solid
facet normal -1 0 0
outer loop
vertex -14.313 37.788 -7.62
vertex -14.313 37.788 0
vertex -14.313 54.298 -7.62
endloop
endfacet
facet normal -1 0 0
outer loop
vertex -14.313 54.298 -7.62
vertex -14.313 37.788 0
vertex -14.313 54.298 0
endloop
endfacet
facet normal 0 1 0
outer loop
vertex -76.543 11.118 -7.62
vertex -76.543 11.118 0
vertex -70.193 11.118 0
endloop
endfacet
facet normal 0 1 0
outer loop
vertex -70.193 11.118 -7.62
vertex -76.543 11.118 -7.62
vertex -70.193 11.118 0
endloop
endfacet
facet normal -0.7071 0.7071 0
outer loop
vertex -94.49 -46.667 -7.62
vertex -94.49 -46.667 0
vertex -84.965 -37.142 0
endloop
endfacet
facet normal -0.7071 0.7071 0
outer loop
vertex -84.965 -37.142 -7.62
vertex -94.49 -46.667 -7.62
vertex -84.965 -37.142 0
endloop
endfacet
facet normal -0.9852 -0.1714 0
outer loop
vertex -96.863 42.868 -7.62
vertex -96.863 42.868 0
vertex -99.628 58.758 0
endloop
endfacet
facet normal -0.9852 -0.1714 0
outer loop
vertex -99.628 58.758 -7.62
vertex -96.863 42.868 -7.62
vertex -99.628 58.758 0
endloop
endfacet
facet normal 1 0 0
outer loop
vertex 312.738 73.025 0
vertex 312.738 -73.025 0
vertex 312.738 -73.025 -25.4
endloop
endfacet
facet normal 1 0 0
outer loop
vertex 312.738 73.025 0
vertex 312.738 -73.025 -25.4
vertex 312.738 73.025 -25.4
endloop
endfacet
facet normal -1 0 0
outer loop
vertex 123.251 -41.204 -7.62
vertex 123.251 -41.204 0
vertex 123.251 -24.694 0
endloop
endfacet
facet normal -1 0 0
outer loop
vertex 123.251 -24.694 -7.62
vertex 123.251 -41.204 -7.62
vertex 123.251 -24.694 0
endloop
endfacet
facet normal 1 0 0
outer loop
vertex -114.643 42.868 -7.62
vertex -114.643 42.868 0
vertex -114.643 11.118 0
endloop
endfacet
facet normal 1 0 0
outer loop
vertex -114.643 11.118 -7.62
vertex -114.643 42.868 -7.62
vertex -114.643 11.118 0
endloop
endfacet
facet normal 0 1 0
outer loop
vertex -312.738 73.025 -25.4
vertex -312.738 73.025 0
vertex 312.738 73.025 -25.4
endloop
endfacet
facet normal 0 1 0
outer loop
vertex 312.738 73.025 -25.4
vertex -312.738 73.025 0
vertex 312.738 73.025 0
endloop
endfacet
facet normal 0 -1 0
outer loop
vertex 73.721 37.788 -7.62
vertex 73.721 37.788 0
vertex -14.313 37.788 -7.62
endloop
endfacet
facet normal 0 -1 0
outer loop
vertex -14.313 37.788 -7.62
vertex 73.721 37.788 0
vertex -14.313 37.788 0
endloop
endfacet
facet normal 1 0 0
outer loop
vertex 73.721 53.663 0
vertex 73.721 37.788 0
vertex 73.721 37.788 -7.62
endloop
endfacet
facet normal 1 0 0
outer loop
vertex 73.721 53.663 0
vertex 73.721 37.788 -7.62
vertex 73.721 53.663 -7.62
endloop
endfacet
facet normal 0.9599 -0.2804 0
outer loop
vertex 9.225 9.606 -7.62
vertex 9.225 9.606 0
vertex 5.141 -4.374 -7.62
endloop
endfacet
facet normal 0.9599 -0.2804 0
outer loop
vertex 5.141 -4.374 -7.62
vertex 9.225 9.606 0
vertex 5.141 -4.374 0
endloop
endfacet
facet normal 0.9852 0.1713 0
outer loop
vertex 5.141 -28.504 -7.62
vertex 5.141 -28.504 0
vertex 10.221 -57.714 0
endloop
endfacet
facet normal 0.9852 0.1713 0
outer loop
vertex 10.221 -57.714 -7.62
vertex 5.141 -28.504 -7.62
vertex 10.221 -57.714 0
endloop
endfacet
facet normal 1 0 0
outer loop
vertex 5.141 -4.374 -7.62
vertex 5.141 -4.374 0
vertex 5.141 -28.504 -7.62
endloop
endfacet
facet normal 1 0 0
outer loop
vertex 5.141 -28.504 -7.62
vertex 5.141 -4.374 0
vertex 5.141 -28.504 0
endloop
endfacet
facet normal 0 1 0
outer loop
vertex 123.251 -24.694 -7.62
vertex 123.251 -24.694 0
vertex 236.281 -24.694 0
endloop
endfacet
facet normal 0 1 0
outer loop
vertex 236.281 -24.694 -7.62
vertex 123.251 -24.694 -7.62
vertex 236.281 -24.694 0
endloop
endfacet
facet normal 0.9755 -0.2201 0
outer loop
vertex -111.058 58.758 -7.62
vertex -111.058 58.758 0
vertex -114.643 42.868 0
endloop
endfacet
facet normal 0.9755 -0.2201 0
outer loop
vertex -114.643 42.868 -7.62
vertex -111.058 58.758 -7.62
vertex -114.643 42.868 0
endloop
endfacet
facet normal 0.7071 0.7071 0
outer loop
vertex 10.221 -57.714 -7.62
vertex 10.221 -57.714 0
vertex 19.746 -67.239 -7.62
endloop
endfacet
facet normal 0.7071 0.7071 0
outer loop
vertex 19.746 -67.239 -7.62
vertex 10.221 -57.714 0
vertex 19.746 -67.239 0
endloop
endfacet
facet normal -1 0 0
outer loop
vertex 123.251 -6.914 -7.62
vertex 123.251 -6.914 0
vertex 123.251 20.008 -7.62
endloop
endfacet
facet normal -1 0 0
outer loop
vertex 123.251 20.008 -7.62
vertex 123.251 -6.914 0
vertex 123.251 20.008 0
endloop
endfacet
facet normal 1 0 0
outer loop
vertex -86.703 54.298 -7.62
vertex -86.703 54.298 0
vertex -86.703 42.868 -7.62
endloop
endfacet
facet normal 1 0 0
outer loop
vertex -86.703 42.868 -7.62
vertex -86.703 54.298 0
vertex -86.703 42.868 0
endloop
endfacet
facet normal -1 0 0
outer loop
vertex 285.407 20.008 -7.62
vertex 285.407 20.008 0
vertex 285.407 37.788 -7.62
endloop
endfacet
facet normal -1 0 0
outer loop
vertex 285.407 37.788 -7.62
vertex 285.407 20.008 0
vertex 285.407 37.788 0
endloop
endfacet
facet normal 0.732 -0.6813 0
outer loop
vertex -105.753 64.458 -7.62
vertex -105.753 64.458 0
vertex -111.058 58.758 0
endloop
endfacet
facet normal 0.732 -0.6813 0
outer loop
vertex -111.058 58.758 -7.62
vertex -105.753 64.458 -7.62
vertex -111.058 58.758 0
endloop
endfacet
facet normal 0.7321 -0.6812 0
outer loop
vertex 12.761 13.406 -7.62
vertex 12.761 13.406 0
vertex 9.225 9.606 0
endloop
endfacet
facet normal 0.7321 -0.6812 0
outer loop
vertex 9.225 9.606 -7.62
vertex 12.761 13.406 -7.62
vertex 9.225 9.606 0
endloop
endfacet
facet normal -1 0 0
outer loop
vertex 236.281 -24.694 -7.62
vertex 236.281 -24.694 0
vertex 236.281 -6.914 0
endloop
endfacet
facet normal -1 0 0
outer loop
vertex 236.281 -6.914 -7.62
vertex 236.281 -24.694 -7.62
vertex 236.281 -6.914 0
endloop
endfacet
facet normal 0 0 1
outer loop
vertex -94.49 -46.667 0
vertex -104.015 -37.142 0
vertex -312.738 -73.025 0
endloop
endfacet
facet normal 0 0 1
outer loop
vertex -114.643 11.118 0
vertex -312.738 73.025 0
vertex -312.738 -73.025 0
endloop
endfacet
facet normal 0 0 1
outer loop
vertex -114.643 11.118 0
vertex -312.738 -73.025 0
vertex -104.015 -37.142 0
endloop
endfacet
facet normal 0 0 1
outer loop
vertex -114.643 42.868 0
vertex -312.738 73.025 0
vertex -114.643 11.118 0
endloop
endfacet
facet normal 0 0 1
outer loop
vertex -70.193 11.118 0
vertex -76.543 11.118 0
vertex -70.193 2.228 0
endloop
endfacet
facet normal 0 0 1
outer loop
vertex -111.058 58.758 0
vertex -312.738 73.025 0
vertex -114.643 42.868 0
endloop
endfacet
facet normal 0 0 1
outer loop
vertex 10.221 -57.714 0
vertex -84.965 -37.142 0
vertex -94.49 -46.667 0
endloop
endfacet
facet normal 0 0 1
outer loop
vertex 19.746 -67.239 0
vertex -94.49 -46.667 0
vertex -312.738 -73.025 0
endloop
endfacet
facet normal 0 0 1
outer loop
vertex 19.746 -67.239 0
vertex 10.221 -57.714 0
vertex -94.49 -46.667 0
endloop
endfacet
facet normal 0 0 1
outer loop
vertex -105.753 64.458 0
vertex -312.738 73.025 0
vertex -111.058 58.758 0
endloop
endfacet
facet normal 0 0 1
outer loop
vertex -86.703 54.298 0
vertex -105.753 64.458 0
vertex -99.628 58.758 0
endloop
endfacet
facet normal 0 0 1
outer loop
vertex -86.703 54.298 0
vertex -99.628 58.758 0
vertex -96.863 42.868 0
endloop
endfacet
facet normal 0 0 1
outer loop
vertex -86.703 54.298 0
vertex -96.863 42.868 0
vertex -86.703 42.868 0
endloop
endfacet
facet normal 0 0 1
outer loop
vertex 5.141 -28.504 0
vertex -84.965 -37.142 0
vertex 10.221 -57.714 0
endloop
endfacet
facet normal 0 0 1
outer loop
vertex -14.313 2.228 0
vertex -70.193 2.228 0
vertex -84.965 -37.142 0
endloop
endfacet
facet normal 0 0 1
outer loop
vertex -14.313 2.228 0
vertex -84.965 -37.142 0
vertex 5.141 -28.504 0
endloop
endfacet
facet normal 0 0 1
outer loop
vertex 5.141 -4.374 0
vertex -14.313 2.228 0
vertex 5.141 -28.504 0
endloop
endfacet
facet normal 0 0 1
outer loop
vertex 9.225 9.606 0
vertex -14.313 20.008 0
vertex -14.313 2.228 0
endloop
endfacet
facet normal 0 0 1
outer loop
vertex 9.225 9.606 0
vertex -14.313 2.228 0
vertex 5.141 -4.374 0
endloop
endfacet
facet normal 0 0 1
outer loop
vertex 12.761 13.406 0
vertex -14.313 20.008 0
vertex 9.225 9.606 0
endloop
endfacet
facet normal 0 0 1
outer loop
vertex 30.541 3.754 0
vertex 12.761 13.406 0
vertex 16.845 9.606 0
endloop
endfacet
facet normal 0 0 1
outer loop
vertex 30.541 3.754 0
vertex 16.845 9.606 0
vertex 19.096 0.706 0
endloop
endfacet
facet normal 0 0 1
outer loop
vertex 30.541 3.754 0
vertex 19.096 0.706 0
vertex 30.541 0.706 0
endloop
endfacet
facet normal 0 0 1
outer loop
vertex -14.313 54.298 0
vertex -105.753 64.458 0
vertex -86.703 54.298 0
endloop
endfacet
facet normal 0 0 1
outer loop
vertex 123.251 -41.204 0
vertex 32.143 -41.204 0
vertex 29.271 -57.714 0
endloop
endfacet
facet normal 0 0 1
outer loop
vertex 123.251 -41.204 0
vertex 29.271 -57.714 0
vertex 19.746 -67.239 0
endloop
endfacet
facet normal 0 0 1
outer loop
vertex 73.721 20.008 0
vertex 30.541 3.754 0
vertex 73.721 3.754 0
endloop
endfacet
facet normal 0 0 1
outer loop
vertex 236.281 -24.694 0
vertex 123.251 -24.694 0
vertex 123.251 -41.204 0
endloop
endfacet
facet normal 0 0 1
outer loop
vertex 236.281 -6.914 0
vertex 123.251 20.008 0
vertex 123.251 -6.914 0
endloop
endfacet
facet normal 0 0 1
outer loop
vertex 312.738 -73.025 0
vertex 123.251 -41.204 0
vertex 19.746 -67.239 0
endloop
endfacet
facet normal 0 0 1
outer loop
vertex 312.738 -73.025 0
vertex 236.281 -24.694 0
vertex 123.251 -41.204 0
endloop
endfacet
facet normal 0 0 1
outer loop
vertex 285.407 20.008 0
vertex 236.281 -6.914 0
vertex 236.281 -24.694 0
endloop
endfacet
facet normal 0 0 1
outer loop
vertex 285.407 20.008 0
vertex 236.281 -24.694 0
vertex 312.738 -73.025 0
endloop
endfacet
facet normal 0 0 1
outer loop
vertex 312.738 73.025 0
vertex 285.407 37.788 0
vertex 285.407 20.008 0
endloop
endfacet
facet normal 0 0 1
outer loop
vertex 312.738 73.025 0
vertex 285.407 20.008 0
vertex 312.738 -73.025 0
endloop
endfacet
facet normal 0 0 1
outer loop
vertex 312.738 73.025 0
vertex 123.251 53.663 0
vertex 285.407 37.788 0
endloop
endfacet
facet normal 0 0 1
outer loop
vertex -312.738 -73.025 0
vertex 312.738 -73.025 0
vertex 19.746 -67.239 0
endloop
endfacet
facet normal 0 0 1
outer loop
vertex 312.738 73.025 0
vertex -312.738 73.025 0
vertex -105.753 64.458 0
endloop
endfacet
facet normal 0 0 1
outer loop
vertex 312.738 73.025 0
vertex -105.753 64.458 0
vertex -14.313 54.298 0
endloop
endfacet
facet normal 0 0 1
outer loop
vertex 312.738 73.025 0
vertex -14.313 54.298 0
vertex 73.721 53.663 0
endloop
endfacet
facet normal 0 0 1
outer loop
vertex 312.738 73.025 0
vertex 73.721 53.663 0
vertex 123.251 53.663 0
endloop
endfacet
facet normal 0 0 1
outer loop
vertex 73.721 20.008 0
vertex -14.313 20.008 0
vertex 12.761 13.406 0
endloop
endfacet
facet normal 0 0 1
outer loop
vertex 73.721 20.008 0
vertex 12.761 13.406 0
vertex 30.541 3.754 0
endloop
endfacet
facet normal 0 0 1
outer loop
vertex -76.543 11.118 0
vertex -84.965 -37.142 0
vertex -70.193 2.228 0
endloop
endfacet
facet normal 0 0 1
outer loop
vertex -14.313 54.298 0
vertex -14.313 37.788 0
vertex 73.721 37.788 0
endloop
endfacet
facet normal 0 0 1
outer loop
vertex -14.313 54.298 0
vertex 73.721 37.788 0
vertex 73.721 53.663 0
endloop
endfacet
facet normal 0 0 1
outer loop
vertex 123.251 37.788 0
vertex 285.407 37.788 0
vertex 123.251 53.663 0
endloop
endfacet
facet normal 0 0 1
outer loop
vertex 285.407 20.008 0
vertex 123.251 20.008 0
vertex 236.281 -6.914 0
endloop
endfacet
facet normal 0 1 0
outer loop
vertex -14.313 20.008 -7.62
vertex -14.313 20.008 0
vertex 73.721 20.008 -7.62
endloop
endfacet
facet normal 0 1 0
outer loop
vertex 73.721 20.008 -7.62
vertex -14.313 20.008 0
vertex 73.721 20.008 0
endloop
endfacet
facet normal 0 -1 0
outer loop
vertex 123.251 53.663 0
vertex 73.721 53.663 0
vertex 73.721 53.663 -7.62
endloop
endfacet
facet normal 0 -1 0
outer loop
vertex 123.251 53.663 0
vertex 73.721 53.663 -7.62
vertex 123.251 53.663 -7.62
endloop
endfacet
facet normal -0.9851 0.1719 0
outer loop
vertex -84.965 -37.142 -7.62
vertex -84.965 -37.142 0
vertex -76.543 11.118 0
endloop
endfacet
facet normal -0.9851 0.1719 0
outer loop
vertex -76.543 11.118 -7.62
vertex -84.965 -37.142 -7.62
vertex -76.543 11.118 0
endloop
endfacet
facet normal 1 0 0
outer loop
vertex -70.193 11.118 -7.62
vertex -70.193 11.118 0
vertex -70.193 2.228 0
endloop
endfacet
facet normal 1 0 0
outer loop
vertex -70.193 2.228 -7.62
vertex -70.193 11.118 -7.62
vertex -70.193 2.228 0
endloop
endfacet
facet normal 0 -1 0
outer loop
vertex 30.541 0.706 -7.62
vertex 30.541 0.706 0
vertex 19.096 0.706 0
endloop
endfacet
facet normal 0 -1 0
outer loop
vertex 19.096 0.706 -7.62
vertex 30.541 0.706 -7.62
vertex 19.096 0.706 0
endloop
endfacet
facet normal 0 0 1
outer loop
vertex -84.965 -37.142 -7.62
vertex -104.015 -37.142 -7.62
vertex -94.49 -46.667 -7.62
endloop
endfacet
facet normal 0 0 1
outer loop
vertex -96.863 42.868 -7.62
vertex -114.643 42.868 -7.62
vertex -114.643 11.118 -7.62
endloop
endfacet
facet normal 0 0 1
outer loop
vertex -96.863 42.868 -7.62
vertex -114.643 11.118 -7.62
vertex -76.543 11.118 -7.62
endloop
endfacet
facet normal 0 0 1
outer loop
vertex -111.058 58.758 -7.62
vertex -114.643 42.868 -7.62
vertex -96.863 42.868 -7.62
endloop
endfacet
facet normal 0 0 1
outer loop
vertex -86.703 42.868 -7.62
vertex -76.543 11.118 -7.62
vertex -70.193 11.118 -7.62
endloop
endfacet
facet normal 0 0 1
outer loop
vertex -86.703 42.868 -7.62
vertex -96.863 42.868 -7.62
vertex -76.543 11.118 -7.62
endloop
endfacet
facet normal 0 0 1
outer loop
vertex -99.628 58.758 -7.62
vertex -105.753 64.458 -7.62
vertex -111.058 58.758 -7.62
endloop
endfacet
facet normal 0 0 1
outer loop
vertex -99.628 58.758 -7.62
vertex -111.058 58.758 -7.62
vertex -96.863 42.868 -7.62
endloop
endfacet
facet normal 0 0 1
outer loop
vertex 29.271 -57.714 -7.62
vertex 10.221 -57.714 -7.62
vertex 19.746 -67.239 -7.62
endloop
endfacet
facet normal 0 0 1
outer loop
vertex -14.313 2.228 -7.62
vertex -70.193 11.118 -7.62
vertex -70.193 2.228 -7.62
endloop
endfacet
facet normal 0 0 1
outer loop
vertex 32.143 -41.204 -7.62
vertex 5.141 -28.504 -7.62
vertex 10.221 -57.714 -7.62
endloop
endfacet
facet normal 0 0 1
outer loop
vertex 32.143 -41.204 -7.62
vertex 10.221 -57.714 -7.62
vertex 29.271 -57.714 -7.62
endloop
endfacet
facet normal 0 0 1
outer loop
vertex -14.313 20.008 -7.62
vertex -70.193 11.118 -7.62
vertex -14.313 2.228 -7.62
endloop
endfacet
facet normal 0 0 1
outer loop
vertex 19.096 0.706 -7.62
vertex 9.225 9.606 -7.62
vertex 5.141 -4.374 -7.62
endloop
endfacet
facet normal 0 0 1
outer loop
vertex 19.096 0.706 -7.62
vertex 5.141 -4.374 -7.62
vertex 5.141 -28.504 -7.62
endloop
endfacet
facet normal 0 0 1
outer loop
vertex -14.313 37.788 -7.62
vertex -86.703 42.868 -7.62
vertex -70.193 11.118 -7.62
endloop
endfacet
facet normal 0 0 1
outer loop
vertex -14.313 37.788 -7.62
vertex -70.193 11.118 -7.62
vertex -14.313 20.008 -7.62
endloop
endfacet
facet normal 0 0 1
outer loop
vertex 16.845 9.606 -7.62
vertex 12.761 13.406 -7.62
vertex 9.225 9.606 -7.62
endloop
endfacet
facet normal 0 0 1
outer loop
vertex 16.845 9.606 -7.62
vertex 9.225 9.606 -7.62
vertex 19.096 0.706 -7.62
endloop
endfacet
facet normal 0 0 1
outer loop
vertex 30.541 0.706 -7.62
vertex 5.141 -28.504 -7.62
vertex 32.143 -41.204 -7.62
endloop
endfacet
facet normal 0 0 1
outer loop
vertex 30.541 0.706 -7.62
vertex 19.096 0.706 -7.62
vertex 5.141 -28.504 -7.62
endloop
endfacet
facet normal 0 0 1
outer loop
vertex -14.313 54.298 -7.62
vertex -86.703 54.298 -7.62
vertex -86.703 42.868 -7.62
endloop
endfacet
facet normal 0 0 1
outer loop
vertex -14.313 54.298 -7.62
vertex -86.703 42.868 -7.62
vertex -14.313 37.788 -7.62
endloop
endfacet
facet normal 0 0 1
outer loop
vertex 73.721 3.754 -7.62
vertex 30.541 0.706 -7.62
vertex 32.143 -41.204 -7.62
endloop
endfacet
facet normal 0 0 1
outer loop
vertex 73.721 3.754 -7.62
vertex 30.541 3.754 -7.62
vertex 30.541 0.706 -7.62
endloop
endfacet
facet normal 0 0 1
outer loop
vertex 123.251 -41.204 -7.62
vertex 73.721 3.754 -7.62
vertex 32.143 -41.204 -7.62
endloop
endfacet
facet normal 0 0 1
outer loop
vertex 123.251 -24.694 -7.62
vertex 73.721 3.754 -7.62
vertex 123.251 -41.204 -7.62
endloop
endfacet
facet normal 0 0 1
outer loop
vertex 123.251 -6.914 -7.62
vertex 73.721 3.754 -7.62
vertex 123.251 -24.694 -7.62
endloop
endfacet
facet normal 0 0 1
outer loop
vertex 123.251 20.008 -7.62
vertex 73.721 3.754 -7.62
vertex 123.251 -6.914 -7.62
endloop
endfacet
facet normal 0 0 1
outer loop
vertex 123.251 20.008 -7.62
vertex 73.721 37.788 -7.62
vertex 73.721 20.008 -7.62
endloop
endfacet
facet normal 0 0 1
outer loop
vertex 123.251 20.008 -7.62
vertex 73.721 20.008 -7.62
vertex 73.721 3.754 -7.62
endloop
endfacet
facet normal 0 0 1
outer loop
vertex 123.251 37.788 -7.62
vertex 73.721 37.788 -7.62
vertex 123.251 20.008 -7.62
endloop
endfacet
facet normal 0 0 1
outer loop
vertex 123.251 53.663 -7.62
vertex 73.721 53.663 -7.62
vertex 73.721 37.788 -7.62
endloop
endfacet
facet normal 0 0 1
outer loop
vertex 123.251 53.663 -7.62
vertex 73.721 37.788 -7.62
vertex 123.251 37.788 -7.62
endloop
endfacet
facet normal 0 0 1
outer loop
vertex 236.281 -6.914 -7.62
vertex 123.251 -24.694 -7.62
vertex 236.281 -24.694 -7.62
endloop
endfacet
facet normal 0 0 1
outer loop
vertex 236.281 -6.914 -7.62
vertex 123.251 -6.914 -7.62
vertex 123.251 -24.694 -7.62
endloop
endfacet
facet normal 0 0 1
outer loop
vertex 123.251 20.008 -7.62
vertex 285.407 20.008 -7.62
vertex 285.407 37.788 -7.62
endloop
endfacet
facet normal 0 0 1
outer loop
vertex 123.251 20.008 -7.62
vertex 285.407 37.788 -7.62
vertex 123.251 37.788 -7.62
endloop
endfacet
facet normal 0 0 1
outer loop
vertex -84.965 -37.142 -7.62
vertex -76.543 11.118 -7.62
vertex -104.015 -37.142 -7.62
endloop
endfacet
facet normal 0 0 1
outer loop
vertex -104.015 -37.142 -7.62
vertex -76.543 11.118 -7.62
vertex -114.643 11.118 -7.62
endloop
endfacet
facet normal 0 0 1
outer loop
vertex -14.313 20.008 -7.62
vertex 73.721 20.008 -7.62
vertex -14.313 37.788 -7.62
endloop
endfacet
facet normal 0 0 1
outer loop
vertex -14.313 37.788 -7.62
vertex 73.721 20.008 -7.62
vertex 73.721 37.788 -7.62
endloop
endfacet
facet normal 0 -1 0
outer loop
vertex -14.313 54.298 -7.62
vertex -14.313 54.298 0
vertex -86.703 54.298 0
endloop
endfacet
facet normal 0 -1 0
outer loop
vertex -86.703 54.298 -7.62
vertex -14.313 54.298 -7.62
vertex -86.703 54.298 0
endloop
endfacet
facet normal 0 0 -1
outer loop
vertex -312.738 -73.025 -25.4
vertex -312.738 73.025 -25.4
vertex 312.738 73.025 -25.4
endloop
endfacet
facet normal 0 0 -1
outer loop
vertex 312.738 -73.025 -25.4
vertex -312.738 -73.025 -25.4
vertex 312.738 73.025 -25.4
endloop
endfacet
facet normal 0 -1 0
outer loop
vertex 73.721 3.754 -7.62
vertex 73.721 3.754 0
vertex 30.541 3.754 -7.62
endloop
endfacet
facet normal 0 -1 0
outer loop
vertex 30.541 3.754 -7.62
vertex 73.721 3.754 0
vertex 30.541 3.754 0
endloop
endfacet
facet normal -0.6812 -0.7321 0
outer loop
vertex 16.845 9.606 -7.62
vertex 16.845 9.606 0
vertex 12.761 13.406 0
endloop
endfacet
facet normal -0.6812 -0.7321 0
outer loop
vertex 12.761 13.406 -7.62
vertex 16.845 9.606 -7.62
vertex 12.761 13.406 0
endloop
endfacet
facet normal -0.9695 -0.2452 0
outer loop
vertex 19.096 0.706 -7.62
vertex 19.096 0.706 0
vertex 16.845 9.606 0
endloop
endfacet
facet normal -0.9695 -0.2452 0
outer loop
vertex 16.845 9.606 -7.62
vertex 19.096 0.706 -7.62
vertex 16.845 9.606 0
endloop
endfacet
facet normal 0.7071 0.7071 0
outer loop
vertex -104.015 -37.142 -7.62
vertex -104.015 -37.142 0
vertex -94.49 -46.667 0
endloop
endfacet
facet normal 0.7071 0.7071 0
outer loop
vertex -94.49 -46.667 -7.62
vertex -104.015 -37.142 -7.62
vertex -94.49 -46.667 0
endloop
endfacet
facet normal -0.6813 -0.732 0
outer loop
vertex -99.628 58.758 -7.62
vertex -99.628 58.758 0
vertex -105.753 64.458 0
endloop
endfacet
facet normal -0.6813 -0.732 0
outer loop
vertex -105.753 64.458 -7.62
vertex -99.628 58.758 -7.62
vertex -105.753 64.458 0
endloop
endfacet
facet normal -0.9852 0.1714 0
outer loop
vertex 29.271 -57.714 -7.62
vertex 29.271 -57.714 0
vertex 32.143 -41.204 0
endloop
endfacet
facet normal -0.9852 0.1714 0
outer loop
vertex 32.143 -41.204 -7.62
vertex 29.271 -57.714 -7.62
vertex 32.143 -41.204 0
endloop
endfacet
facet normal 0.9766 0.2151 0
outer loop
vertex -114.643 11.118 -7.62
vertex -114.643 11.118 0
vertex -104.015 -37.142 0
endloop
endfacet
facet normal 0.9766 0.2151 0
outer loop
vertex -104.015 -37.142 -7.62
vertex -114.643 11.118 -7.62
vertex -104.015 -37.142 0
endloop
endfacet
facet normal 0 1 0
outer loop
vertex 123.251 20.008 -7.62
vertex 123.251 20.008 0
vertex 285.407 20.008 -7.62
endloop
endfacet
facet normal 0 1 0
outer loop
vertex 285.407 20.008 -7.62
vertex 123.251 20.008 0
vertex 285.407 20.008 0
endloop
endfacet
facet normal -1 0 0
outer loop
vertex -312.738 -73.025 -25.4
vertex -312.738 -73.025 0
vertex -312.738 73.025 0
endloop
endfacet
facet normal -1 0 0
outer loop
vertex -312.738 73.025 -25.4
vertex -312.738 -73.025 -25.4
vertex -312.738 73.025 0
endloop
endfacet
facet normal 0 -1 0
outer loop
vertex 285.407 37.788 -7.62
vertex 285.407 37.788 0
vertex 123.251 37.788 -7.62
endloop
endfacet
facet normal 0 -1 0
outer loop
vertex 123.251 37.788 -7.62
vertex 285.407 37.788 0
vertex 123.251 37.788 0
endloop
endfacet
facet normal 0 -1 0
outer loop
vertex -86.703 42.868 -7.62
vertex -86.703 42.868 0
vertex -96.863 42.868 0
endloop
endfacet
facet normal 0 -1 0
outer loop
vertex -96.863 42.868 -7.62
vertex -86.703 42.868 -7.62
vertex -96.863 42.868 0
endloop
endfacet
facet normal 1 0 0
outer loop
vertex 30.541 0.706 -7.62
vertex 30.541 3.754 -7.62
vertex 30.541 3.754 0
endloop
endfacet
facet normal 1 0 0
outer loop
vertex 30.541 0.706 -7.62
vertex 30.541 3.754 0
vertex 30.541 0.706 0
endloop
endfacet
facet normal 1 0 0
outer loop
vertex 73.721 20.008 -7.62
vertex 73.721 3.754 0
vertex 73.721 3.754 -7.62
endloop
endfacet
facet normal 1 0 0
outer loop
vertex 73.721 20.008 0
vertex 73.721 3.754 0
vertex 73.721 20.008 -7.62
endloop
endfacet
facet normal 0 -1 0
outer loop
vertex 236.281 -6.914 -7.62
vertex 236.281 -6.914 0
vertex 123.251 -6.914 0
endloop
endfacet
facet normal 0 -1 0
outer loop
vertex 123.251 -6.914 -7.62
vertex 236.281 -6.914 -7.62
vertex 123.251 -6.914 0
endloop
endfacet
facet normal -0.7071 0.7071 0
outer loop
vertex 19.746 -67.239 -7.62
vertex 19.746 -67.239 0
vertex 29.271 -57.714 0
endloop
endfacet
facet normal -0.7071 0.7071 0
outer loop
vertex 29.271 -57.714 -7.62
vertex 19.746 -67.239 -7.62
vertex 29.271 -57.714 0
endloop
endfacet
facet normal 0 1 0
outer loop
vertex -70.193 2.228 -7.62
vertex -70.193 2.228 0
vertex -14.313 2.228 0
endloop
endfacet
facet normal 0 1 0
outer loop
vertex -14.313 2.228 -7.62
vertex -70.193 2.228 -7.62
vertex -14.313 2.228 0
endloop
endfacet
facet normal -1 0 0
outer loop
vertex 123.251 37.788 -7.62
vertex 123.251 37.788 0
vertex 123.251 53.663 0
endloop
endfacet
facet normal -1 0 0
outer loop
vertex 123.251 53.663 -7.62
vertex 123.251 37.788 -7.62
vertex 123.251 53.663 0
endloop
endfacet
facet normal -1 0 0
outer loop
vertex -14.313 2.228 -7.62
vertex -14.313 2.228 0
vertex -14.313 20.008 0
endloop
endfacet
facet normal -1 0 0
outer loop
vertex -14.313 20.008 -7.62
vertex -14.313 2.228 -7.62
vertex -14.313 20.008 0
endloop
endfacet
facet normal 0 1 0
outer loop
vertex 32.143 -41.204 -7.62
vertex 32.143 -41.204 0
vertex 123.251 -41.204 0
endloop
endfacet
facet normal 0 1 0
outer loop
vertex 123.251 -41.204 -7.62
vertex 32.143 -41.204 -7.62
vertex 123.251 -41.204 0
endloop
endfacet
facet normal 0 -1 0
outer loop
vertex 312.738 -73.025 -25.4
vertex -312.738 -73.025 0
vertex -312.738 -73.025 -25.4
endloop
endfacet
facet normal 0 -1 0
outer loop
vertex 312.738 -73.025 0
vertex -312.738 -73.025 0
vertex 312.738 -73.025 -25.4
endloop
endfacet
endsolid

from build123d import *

# Parameters (mm, degrees)
F0_W     = 625.475
F0_H     = 146.05
F3_DEPTH = 25.4
F4_DEPTH = 7.62
F2_W     = 49.53
F2_H     = 17.78
F2_H_2   = 16.2543391211
F2_W_2   = 162.1558675107
F2_H_3   = 15.875
F5_DEPTH = 7.62


with BuildPart() as f3:
    # F0 (on Top) → F3 (new body)
    with BuildSketch(Plane.XY):
        Rectangle(F0_W, F0_H)
    extrude(amount=-F3_DEPTH)

    # F1 (on Top) → F4 (cut)
    with BuildSketch(Plane.XY):
        Polygon((5.1413444427, -28.5038674987), (10.2213444427, -57.7138674987), (19.7463444427, -67.2388674987), (29.2713444427, -57.7138674987), (32.1426487905, -41.2038674987), (123.2513444427, -41.2038674987), (123.2513444427, -24.6938674987), (236.2813444427, -24.6938674987), (236.2813444427, -6.9138674987), (123.2513444427, -6.9138674987), (123.2513444427, 3.7541325013), (30.5413444427, 3.7541325013), (30.5413444427, 0.7061325013), (30.5413444427, -4.3738674987), (20.3813444427, -4.3738674987), (19.0962397041, 0.7061325013), (16.8448203131, 9.6059600121), (12.7613444427, 13.4061325013), (9.2248203131, 9.6059600121), (5.1413444427, -4.3738674987), align=None)
        Polygon((30.5413444427, 0.7061325013), (19.0962397041, 0.7061325013), (20.3813444427, -4.3738674987), (30.5413444427, -4.3738674987), align=None)
    extrude(amount=-F4_DEPTH, mode=Mode.SUBTRACT)

    # F2 (on Top) → F5 (cut)
    with BuildSketch(Plane.XY):
        Polygon((-114.6427880466, 11.1184716225), (-104.0148213506, -37.1415283775), (-94.4898213506, -46.6665283775), (-84.9648213506, -37.1415283775), (-76.5427880466, 11.1184716225), (-70.1927880466, 11.1184716225), (-70.1927880466, 2.2284716225), (-14.3127880466, 2.2284716225), (-14.3127880466, 20.0084716225), (73.7213444427, 20.0084716225), (73.7213444427, 37.7884716225), (-14.3127880466, 37.7884716225), (-14.3127880466, 54.2984716225), (-86.7027880466, 54.2984716225), (-86.7027880466, 42.8684716225), (-96.8627880466, 42.8684716225), (-99.627574241, 58.7582128885), (-105.7527880466, 64.4584716225), (-111.057574241, 58.7582128885), (-114.6427880466, 42.8684716225), align=None)
        with Locations((98.4863444427, 28.8984716225)):
            Rectangle(F2_W, F2_H)
        with Locations((98.4863444427, 11.8813020619)):
            Rectangle(F2_W, F2_H_2)
        with Locations((204.329278198, 28.8984716225)):
            Rectangle(F2_W_2, F2_H)
        with Locations((98.4863444427, 45.7259716225)):
            Rectangle(F2_W, F2_H_3)
    extrude(amount=-F5_DEPTH, mode=Mode.SUBTRACT)


solid = f3.part
